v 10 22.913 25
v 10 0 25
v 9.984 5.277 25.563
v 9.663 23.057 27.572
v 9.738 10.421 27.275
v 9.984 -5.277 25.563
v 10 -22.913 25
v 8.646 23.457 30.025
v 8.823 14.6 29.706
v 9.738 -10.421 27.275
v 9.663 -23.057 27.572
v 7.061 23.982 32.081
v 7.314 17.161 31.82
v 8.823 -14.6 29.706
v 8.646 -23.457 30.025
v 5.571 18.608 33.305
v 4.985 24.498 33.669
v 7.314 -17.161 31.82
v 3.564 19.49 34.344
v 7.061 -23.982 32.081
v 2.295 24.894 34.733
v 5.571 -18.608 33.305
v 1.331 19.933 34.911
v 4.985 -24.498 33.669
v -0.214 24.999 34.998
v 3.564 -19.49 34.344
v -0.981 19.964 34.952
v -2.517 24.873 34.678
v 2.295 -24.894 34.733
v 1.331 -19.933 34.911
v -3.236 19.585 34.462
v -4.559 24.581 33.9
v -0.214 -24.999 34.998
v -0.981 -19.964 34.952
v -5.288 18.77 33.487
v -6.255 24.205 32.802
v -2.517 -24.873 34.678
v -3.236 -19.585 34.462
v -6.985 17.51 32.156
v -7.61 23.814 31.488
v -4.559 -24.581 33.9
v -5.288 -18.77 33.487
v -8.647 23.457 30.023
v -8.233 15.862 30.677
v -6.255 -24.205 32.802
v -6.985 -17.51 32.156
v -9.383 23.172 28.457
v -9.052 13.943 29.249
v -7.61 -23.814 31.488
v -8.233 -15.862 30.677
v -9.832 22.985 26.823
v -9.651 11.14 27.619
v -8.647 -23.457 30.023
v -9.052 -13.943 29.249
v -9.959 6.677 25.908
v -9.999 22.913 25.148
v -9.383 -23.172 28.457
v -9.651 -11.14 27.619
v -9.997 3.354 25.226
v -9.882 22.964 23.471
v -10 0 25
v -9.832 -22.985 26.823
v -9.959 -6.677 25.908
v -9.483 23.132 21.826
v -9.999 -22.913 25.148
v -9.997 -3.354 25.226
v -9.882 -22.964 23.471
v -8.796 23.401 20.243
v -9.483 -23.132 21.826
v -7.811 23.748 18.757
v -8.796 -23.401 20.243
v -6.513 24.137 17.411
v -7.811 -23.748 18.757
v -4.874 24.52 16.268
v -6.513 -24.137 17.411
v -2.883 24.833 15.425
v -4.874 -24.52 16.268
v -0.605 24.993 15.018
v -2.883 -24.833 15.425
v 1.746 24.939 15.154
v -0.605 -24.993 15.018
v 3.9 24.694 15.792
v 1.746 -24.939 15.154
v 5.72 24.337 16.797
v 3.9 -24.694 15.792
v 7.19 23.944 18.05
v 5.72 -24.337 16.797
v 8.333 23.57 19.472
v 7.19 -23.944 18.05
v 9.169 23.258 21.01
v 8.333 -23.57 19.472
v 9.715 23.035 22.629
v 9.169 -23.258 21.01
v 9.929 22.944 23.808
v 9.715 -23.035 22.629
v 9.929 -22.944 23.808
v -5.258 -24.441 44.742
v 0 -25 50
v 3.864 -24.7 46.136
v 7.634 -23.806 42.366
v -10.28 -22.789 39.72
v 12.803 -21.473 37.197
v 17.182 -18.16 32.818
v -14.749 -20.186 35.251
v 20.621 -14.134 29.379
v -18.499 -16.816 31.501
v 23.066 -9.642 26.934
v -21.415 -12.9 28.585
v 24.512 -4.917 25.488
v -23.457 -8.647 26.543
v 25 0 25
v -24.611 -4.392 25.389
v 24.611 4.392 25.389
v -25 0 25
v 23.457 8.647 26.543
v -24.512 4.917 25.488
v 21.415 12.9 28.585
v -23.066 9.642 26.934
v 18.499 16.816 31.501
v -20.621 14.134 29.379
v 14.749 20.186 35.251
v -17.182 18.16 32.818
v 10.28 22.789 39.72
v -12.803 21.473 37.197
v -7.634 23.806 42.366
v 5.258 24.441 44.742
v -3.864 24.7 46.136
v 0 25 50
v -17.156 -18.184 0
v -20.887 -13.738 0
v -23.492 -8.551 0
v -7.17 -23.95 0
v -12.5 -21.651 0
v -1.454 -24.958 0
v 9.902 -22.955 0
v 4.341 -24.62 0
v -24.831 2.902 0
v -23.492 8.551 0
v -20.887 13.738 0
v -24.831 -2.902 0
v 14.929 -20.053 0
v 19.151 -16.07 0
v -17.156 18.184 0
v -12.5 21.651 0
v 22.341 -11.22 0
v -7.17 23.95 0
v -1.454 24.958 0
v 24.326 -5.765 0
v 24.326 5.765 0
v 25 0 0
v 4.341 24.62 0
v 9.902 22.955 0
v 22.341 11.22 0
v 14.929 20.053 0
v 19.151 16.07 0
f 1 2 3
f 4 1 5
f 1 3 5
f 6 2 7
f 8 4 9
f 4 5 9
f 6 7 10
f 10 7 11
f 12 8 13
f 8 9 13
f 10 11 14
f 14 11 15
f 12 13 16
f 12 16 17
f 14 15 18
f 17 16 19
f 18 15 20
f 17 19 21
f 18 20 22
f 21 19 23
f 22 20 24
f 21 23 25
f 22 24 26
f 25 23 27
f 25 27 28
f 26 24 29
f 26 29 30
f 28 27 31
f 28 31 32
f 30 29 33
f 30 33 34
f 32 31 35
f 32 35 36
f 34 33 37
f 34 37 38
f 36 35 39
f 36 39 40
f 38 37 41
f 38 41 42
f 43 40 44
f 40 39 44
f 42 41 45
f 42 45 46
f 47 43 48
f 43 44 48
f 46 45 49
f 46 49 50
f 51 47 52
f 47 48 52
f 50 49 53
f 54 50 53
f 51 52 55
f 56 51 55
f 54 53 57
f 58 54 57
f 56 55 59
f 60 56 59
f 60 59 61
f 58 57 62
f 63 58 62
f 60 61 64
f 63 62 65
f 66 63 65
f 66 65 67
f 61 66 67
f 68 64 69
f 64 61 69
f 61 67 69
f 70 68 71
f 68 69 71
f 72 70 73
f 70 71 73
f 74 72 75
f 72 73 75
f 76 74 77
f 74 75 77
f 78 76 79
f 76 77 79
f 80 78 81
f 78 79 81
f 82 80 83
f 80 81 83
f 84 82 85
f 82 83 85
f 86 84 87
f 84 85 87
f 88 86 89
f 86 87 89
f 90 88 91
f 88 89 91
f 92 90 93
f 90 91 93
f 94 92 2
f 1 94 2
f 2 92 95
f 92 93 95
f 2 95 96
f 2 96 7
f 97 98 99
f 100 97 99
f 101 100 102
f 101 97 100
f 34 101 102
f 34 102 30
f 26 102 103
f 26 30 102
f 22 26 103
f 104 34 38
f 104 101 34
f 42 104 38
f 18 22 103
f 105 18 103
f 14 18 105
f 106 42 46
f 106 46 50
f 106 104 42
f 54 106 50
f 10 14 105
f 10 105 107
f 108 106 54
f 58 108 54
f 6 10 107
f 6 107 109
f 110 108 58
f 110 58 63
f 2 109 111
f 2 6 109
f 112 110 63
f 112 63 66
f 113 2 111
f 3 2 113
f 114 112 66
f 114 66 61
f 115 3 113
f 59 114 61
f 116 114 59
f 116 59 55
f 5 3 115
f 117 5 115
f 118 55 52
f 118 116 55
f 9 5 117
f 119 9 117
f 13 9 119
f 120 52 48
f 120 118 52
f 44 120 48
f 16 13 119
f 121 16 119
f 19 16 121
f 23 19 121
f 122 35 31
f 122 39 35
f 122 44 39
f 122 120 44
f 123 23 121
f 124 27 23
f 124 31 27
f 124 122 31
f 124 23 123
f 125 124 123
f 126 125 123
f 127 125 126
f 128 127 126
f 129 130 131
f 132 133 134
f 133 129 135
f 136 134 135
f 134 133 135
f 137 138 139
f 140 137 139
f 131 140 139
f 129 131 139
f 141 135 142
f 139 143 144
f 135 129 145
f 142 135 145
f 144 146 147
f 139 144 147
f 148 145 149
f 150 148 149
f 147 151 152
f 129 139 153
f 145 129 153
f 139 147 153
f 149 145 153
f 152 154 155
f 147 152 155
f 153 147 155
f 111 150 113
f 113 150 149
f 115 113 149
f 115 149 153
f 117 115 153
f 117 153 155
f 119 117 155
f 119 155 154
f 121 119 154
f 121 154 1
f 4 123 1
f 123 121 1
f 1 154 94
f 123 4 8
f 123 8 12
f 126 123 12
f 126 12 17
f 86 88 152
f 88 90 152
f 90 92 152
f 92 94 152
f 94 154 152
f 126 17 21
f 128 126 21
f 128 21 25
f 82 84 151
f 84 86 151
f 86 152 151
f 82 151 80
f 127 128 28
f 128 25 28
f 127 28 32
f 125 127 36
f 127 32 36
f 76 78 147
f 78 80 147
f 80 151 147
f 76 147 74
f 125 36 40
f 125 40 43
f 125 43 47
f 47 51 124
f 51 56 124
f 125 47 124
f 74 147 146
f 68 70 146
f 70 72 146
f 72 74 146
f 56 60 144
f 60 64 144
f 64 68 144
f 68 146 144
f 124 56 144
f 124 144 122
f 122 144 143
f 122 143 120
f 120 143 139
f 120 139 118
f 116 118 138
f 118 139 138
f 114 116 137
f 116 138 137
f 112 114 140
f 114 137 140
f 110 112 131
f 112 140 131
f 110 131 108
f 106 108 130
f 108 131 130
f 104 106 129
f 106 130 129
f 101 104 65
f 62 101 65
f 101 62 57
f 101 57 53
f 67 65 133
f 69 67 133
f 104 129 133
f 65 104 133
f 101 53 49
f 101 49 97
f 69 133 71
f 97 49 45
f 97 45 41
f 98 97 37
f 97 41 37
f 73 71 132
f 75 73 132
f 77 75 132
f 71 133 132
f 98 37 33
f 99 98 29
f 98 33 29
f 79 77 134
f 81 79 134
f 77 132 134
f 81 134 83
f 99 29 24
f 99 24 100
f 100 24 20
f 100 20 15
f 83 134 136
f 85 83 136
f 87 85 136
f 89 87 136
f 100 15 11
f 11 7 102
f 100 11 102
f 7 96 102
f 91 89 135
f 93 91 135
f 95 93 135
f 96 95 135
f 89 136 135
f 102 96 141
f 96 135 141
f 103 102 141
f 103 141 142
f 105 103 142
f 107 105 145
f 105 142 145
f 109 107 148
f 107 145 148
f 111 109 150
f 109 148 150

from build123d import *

# Parameters (mm, degrees)
F0_R          = 25
F1_DEPTH      = 50
F3_DEPTH      = 25.001
F3_DEPTH_BACK = 25.001
F4_R          = 10
F5_DEPTH      = 25.001
F5_DEPTH_BACK = 25.001


with BuildPart() as f1:
    # F0 (on Top) → F1 (new body)
    with BuildSketch(Plane.XY):
        Circle(F0_R)
    extrude(amount=F1_DEPTH)

    # F2 (on Right) → F3 (cut, two sides)
    with BuildSketch(Plane.YZ) as f3_sk:
        with BuildLine():
            ThreePointArc((-25, 50), (0, 25), (25, 50))
            ThreePointArc((25, 50), (0, 75), (-25, 50))
        make_face()
    extrude(amount=-F3_DEPTH, mode=Mode.SUBTRACT)
    extrude(f3_sk.sketch, amount=F3_DEPTH_BACK, mode=Mode.SUBTRACT)

    # F4 (on Front) → F5 (cut, two sides)
    with BuildSketch(Plane.XZ) as f5_sk:
        with Locations((0, 25)):
            Circle(F4_R)
    extrude(amount=F5_DEPTH, mode=Mode.SUBTRACT)
    extrude(f5_sk.sketch, amount=-F5_DEPTH_BACK, mode=Mode.SUBTRACT)


solid = f1.part
